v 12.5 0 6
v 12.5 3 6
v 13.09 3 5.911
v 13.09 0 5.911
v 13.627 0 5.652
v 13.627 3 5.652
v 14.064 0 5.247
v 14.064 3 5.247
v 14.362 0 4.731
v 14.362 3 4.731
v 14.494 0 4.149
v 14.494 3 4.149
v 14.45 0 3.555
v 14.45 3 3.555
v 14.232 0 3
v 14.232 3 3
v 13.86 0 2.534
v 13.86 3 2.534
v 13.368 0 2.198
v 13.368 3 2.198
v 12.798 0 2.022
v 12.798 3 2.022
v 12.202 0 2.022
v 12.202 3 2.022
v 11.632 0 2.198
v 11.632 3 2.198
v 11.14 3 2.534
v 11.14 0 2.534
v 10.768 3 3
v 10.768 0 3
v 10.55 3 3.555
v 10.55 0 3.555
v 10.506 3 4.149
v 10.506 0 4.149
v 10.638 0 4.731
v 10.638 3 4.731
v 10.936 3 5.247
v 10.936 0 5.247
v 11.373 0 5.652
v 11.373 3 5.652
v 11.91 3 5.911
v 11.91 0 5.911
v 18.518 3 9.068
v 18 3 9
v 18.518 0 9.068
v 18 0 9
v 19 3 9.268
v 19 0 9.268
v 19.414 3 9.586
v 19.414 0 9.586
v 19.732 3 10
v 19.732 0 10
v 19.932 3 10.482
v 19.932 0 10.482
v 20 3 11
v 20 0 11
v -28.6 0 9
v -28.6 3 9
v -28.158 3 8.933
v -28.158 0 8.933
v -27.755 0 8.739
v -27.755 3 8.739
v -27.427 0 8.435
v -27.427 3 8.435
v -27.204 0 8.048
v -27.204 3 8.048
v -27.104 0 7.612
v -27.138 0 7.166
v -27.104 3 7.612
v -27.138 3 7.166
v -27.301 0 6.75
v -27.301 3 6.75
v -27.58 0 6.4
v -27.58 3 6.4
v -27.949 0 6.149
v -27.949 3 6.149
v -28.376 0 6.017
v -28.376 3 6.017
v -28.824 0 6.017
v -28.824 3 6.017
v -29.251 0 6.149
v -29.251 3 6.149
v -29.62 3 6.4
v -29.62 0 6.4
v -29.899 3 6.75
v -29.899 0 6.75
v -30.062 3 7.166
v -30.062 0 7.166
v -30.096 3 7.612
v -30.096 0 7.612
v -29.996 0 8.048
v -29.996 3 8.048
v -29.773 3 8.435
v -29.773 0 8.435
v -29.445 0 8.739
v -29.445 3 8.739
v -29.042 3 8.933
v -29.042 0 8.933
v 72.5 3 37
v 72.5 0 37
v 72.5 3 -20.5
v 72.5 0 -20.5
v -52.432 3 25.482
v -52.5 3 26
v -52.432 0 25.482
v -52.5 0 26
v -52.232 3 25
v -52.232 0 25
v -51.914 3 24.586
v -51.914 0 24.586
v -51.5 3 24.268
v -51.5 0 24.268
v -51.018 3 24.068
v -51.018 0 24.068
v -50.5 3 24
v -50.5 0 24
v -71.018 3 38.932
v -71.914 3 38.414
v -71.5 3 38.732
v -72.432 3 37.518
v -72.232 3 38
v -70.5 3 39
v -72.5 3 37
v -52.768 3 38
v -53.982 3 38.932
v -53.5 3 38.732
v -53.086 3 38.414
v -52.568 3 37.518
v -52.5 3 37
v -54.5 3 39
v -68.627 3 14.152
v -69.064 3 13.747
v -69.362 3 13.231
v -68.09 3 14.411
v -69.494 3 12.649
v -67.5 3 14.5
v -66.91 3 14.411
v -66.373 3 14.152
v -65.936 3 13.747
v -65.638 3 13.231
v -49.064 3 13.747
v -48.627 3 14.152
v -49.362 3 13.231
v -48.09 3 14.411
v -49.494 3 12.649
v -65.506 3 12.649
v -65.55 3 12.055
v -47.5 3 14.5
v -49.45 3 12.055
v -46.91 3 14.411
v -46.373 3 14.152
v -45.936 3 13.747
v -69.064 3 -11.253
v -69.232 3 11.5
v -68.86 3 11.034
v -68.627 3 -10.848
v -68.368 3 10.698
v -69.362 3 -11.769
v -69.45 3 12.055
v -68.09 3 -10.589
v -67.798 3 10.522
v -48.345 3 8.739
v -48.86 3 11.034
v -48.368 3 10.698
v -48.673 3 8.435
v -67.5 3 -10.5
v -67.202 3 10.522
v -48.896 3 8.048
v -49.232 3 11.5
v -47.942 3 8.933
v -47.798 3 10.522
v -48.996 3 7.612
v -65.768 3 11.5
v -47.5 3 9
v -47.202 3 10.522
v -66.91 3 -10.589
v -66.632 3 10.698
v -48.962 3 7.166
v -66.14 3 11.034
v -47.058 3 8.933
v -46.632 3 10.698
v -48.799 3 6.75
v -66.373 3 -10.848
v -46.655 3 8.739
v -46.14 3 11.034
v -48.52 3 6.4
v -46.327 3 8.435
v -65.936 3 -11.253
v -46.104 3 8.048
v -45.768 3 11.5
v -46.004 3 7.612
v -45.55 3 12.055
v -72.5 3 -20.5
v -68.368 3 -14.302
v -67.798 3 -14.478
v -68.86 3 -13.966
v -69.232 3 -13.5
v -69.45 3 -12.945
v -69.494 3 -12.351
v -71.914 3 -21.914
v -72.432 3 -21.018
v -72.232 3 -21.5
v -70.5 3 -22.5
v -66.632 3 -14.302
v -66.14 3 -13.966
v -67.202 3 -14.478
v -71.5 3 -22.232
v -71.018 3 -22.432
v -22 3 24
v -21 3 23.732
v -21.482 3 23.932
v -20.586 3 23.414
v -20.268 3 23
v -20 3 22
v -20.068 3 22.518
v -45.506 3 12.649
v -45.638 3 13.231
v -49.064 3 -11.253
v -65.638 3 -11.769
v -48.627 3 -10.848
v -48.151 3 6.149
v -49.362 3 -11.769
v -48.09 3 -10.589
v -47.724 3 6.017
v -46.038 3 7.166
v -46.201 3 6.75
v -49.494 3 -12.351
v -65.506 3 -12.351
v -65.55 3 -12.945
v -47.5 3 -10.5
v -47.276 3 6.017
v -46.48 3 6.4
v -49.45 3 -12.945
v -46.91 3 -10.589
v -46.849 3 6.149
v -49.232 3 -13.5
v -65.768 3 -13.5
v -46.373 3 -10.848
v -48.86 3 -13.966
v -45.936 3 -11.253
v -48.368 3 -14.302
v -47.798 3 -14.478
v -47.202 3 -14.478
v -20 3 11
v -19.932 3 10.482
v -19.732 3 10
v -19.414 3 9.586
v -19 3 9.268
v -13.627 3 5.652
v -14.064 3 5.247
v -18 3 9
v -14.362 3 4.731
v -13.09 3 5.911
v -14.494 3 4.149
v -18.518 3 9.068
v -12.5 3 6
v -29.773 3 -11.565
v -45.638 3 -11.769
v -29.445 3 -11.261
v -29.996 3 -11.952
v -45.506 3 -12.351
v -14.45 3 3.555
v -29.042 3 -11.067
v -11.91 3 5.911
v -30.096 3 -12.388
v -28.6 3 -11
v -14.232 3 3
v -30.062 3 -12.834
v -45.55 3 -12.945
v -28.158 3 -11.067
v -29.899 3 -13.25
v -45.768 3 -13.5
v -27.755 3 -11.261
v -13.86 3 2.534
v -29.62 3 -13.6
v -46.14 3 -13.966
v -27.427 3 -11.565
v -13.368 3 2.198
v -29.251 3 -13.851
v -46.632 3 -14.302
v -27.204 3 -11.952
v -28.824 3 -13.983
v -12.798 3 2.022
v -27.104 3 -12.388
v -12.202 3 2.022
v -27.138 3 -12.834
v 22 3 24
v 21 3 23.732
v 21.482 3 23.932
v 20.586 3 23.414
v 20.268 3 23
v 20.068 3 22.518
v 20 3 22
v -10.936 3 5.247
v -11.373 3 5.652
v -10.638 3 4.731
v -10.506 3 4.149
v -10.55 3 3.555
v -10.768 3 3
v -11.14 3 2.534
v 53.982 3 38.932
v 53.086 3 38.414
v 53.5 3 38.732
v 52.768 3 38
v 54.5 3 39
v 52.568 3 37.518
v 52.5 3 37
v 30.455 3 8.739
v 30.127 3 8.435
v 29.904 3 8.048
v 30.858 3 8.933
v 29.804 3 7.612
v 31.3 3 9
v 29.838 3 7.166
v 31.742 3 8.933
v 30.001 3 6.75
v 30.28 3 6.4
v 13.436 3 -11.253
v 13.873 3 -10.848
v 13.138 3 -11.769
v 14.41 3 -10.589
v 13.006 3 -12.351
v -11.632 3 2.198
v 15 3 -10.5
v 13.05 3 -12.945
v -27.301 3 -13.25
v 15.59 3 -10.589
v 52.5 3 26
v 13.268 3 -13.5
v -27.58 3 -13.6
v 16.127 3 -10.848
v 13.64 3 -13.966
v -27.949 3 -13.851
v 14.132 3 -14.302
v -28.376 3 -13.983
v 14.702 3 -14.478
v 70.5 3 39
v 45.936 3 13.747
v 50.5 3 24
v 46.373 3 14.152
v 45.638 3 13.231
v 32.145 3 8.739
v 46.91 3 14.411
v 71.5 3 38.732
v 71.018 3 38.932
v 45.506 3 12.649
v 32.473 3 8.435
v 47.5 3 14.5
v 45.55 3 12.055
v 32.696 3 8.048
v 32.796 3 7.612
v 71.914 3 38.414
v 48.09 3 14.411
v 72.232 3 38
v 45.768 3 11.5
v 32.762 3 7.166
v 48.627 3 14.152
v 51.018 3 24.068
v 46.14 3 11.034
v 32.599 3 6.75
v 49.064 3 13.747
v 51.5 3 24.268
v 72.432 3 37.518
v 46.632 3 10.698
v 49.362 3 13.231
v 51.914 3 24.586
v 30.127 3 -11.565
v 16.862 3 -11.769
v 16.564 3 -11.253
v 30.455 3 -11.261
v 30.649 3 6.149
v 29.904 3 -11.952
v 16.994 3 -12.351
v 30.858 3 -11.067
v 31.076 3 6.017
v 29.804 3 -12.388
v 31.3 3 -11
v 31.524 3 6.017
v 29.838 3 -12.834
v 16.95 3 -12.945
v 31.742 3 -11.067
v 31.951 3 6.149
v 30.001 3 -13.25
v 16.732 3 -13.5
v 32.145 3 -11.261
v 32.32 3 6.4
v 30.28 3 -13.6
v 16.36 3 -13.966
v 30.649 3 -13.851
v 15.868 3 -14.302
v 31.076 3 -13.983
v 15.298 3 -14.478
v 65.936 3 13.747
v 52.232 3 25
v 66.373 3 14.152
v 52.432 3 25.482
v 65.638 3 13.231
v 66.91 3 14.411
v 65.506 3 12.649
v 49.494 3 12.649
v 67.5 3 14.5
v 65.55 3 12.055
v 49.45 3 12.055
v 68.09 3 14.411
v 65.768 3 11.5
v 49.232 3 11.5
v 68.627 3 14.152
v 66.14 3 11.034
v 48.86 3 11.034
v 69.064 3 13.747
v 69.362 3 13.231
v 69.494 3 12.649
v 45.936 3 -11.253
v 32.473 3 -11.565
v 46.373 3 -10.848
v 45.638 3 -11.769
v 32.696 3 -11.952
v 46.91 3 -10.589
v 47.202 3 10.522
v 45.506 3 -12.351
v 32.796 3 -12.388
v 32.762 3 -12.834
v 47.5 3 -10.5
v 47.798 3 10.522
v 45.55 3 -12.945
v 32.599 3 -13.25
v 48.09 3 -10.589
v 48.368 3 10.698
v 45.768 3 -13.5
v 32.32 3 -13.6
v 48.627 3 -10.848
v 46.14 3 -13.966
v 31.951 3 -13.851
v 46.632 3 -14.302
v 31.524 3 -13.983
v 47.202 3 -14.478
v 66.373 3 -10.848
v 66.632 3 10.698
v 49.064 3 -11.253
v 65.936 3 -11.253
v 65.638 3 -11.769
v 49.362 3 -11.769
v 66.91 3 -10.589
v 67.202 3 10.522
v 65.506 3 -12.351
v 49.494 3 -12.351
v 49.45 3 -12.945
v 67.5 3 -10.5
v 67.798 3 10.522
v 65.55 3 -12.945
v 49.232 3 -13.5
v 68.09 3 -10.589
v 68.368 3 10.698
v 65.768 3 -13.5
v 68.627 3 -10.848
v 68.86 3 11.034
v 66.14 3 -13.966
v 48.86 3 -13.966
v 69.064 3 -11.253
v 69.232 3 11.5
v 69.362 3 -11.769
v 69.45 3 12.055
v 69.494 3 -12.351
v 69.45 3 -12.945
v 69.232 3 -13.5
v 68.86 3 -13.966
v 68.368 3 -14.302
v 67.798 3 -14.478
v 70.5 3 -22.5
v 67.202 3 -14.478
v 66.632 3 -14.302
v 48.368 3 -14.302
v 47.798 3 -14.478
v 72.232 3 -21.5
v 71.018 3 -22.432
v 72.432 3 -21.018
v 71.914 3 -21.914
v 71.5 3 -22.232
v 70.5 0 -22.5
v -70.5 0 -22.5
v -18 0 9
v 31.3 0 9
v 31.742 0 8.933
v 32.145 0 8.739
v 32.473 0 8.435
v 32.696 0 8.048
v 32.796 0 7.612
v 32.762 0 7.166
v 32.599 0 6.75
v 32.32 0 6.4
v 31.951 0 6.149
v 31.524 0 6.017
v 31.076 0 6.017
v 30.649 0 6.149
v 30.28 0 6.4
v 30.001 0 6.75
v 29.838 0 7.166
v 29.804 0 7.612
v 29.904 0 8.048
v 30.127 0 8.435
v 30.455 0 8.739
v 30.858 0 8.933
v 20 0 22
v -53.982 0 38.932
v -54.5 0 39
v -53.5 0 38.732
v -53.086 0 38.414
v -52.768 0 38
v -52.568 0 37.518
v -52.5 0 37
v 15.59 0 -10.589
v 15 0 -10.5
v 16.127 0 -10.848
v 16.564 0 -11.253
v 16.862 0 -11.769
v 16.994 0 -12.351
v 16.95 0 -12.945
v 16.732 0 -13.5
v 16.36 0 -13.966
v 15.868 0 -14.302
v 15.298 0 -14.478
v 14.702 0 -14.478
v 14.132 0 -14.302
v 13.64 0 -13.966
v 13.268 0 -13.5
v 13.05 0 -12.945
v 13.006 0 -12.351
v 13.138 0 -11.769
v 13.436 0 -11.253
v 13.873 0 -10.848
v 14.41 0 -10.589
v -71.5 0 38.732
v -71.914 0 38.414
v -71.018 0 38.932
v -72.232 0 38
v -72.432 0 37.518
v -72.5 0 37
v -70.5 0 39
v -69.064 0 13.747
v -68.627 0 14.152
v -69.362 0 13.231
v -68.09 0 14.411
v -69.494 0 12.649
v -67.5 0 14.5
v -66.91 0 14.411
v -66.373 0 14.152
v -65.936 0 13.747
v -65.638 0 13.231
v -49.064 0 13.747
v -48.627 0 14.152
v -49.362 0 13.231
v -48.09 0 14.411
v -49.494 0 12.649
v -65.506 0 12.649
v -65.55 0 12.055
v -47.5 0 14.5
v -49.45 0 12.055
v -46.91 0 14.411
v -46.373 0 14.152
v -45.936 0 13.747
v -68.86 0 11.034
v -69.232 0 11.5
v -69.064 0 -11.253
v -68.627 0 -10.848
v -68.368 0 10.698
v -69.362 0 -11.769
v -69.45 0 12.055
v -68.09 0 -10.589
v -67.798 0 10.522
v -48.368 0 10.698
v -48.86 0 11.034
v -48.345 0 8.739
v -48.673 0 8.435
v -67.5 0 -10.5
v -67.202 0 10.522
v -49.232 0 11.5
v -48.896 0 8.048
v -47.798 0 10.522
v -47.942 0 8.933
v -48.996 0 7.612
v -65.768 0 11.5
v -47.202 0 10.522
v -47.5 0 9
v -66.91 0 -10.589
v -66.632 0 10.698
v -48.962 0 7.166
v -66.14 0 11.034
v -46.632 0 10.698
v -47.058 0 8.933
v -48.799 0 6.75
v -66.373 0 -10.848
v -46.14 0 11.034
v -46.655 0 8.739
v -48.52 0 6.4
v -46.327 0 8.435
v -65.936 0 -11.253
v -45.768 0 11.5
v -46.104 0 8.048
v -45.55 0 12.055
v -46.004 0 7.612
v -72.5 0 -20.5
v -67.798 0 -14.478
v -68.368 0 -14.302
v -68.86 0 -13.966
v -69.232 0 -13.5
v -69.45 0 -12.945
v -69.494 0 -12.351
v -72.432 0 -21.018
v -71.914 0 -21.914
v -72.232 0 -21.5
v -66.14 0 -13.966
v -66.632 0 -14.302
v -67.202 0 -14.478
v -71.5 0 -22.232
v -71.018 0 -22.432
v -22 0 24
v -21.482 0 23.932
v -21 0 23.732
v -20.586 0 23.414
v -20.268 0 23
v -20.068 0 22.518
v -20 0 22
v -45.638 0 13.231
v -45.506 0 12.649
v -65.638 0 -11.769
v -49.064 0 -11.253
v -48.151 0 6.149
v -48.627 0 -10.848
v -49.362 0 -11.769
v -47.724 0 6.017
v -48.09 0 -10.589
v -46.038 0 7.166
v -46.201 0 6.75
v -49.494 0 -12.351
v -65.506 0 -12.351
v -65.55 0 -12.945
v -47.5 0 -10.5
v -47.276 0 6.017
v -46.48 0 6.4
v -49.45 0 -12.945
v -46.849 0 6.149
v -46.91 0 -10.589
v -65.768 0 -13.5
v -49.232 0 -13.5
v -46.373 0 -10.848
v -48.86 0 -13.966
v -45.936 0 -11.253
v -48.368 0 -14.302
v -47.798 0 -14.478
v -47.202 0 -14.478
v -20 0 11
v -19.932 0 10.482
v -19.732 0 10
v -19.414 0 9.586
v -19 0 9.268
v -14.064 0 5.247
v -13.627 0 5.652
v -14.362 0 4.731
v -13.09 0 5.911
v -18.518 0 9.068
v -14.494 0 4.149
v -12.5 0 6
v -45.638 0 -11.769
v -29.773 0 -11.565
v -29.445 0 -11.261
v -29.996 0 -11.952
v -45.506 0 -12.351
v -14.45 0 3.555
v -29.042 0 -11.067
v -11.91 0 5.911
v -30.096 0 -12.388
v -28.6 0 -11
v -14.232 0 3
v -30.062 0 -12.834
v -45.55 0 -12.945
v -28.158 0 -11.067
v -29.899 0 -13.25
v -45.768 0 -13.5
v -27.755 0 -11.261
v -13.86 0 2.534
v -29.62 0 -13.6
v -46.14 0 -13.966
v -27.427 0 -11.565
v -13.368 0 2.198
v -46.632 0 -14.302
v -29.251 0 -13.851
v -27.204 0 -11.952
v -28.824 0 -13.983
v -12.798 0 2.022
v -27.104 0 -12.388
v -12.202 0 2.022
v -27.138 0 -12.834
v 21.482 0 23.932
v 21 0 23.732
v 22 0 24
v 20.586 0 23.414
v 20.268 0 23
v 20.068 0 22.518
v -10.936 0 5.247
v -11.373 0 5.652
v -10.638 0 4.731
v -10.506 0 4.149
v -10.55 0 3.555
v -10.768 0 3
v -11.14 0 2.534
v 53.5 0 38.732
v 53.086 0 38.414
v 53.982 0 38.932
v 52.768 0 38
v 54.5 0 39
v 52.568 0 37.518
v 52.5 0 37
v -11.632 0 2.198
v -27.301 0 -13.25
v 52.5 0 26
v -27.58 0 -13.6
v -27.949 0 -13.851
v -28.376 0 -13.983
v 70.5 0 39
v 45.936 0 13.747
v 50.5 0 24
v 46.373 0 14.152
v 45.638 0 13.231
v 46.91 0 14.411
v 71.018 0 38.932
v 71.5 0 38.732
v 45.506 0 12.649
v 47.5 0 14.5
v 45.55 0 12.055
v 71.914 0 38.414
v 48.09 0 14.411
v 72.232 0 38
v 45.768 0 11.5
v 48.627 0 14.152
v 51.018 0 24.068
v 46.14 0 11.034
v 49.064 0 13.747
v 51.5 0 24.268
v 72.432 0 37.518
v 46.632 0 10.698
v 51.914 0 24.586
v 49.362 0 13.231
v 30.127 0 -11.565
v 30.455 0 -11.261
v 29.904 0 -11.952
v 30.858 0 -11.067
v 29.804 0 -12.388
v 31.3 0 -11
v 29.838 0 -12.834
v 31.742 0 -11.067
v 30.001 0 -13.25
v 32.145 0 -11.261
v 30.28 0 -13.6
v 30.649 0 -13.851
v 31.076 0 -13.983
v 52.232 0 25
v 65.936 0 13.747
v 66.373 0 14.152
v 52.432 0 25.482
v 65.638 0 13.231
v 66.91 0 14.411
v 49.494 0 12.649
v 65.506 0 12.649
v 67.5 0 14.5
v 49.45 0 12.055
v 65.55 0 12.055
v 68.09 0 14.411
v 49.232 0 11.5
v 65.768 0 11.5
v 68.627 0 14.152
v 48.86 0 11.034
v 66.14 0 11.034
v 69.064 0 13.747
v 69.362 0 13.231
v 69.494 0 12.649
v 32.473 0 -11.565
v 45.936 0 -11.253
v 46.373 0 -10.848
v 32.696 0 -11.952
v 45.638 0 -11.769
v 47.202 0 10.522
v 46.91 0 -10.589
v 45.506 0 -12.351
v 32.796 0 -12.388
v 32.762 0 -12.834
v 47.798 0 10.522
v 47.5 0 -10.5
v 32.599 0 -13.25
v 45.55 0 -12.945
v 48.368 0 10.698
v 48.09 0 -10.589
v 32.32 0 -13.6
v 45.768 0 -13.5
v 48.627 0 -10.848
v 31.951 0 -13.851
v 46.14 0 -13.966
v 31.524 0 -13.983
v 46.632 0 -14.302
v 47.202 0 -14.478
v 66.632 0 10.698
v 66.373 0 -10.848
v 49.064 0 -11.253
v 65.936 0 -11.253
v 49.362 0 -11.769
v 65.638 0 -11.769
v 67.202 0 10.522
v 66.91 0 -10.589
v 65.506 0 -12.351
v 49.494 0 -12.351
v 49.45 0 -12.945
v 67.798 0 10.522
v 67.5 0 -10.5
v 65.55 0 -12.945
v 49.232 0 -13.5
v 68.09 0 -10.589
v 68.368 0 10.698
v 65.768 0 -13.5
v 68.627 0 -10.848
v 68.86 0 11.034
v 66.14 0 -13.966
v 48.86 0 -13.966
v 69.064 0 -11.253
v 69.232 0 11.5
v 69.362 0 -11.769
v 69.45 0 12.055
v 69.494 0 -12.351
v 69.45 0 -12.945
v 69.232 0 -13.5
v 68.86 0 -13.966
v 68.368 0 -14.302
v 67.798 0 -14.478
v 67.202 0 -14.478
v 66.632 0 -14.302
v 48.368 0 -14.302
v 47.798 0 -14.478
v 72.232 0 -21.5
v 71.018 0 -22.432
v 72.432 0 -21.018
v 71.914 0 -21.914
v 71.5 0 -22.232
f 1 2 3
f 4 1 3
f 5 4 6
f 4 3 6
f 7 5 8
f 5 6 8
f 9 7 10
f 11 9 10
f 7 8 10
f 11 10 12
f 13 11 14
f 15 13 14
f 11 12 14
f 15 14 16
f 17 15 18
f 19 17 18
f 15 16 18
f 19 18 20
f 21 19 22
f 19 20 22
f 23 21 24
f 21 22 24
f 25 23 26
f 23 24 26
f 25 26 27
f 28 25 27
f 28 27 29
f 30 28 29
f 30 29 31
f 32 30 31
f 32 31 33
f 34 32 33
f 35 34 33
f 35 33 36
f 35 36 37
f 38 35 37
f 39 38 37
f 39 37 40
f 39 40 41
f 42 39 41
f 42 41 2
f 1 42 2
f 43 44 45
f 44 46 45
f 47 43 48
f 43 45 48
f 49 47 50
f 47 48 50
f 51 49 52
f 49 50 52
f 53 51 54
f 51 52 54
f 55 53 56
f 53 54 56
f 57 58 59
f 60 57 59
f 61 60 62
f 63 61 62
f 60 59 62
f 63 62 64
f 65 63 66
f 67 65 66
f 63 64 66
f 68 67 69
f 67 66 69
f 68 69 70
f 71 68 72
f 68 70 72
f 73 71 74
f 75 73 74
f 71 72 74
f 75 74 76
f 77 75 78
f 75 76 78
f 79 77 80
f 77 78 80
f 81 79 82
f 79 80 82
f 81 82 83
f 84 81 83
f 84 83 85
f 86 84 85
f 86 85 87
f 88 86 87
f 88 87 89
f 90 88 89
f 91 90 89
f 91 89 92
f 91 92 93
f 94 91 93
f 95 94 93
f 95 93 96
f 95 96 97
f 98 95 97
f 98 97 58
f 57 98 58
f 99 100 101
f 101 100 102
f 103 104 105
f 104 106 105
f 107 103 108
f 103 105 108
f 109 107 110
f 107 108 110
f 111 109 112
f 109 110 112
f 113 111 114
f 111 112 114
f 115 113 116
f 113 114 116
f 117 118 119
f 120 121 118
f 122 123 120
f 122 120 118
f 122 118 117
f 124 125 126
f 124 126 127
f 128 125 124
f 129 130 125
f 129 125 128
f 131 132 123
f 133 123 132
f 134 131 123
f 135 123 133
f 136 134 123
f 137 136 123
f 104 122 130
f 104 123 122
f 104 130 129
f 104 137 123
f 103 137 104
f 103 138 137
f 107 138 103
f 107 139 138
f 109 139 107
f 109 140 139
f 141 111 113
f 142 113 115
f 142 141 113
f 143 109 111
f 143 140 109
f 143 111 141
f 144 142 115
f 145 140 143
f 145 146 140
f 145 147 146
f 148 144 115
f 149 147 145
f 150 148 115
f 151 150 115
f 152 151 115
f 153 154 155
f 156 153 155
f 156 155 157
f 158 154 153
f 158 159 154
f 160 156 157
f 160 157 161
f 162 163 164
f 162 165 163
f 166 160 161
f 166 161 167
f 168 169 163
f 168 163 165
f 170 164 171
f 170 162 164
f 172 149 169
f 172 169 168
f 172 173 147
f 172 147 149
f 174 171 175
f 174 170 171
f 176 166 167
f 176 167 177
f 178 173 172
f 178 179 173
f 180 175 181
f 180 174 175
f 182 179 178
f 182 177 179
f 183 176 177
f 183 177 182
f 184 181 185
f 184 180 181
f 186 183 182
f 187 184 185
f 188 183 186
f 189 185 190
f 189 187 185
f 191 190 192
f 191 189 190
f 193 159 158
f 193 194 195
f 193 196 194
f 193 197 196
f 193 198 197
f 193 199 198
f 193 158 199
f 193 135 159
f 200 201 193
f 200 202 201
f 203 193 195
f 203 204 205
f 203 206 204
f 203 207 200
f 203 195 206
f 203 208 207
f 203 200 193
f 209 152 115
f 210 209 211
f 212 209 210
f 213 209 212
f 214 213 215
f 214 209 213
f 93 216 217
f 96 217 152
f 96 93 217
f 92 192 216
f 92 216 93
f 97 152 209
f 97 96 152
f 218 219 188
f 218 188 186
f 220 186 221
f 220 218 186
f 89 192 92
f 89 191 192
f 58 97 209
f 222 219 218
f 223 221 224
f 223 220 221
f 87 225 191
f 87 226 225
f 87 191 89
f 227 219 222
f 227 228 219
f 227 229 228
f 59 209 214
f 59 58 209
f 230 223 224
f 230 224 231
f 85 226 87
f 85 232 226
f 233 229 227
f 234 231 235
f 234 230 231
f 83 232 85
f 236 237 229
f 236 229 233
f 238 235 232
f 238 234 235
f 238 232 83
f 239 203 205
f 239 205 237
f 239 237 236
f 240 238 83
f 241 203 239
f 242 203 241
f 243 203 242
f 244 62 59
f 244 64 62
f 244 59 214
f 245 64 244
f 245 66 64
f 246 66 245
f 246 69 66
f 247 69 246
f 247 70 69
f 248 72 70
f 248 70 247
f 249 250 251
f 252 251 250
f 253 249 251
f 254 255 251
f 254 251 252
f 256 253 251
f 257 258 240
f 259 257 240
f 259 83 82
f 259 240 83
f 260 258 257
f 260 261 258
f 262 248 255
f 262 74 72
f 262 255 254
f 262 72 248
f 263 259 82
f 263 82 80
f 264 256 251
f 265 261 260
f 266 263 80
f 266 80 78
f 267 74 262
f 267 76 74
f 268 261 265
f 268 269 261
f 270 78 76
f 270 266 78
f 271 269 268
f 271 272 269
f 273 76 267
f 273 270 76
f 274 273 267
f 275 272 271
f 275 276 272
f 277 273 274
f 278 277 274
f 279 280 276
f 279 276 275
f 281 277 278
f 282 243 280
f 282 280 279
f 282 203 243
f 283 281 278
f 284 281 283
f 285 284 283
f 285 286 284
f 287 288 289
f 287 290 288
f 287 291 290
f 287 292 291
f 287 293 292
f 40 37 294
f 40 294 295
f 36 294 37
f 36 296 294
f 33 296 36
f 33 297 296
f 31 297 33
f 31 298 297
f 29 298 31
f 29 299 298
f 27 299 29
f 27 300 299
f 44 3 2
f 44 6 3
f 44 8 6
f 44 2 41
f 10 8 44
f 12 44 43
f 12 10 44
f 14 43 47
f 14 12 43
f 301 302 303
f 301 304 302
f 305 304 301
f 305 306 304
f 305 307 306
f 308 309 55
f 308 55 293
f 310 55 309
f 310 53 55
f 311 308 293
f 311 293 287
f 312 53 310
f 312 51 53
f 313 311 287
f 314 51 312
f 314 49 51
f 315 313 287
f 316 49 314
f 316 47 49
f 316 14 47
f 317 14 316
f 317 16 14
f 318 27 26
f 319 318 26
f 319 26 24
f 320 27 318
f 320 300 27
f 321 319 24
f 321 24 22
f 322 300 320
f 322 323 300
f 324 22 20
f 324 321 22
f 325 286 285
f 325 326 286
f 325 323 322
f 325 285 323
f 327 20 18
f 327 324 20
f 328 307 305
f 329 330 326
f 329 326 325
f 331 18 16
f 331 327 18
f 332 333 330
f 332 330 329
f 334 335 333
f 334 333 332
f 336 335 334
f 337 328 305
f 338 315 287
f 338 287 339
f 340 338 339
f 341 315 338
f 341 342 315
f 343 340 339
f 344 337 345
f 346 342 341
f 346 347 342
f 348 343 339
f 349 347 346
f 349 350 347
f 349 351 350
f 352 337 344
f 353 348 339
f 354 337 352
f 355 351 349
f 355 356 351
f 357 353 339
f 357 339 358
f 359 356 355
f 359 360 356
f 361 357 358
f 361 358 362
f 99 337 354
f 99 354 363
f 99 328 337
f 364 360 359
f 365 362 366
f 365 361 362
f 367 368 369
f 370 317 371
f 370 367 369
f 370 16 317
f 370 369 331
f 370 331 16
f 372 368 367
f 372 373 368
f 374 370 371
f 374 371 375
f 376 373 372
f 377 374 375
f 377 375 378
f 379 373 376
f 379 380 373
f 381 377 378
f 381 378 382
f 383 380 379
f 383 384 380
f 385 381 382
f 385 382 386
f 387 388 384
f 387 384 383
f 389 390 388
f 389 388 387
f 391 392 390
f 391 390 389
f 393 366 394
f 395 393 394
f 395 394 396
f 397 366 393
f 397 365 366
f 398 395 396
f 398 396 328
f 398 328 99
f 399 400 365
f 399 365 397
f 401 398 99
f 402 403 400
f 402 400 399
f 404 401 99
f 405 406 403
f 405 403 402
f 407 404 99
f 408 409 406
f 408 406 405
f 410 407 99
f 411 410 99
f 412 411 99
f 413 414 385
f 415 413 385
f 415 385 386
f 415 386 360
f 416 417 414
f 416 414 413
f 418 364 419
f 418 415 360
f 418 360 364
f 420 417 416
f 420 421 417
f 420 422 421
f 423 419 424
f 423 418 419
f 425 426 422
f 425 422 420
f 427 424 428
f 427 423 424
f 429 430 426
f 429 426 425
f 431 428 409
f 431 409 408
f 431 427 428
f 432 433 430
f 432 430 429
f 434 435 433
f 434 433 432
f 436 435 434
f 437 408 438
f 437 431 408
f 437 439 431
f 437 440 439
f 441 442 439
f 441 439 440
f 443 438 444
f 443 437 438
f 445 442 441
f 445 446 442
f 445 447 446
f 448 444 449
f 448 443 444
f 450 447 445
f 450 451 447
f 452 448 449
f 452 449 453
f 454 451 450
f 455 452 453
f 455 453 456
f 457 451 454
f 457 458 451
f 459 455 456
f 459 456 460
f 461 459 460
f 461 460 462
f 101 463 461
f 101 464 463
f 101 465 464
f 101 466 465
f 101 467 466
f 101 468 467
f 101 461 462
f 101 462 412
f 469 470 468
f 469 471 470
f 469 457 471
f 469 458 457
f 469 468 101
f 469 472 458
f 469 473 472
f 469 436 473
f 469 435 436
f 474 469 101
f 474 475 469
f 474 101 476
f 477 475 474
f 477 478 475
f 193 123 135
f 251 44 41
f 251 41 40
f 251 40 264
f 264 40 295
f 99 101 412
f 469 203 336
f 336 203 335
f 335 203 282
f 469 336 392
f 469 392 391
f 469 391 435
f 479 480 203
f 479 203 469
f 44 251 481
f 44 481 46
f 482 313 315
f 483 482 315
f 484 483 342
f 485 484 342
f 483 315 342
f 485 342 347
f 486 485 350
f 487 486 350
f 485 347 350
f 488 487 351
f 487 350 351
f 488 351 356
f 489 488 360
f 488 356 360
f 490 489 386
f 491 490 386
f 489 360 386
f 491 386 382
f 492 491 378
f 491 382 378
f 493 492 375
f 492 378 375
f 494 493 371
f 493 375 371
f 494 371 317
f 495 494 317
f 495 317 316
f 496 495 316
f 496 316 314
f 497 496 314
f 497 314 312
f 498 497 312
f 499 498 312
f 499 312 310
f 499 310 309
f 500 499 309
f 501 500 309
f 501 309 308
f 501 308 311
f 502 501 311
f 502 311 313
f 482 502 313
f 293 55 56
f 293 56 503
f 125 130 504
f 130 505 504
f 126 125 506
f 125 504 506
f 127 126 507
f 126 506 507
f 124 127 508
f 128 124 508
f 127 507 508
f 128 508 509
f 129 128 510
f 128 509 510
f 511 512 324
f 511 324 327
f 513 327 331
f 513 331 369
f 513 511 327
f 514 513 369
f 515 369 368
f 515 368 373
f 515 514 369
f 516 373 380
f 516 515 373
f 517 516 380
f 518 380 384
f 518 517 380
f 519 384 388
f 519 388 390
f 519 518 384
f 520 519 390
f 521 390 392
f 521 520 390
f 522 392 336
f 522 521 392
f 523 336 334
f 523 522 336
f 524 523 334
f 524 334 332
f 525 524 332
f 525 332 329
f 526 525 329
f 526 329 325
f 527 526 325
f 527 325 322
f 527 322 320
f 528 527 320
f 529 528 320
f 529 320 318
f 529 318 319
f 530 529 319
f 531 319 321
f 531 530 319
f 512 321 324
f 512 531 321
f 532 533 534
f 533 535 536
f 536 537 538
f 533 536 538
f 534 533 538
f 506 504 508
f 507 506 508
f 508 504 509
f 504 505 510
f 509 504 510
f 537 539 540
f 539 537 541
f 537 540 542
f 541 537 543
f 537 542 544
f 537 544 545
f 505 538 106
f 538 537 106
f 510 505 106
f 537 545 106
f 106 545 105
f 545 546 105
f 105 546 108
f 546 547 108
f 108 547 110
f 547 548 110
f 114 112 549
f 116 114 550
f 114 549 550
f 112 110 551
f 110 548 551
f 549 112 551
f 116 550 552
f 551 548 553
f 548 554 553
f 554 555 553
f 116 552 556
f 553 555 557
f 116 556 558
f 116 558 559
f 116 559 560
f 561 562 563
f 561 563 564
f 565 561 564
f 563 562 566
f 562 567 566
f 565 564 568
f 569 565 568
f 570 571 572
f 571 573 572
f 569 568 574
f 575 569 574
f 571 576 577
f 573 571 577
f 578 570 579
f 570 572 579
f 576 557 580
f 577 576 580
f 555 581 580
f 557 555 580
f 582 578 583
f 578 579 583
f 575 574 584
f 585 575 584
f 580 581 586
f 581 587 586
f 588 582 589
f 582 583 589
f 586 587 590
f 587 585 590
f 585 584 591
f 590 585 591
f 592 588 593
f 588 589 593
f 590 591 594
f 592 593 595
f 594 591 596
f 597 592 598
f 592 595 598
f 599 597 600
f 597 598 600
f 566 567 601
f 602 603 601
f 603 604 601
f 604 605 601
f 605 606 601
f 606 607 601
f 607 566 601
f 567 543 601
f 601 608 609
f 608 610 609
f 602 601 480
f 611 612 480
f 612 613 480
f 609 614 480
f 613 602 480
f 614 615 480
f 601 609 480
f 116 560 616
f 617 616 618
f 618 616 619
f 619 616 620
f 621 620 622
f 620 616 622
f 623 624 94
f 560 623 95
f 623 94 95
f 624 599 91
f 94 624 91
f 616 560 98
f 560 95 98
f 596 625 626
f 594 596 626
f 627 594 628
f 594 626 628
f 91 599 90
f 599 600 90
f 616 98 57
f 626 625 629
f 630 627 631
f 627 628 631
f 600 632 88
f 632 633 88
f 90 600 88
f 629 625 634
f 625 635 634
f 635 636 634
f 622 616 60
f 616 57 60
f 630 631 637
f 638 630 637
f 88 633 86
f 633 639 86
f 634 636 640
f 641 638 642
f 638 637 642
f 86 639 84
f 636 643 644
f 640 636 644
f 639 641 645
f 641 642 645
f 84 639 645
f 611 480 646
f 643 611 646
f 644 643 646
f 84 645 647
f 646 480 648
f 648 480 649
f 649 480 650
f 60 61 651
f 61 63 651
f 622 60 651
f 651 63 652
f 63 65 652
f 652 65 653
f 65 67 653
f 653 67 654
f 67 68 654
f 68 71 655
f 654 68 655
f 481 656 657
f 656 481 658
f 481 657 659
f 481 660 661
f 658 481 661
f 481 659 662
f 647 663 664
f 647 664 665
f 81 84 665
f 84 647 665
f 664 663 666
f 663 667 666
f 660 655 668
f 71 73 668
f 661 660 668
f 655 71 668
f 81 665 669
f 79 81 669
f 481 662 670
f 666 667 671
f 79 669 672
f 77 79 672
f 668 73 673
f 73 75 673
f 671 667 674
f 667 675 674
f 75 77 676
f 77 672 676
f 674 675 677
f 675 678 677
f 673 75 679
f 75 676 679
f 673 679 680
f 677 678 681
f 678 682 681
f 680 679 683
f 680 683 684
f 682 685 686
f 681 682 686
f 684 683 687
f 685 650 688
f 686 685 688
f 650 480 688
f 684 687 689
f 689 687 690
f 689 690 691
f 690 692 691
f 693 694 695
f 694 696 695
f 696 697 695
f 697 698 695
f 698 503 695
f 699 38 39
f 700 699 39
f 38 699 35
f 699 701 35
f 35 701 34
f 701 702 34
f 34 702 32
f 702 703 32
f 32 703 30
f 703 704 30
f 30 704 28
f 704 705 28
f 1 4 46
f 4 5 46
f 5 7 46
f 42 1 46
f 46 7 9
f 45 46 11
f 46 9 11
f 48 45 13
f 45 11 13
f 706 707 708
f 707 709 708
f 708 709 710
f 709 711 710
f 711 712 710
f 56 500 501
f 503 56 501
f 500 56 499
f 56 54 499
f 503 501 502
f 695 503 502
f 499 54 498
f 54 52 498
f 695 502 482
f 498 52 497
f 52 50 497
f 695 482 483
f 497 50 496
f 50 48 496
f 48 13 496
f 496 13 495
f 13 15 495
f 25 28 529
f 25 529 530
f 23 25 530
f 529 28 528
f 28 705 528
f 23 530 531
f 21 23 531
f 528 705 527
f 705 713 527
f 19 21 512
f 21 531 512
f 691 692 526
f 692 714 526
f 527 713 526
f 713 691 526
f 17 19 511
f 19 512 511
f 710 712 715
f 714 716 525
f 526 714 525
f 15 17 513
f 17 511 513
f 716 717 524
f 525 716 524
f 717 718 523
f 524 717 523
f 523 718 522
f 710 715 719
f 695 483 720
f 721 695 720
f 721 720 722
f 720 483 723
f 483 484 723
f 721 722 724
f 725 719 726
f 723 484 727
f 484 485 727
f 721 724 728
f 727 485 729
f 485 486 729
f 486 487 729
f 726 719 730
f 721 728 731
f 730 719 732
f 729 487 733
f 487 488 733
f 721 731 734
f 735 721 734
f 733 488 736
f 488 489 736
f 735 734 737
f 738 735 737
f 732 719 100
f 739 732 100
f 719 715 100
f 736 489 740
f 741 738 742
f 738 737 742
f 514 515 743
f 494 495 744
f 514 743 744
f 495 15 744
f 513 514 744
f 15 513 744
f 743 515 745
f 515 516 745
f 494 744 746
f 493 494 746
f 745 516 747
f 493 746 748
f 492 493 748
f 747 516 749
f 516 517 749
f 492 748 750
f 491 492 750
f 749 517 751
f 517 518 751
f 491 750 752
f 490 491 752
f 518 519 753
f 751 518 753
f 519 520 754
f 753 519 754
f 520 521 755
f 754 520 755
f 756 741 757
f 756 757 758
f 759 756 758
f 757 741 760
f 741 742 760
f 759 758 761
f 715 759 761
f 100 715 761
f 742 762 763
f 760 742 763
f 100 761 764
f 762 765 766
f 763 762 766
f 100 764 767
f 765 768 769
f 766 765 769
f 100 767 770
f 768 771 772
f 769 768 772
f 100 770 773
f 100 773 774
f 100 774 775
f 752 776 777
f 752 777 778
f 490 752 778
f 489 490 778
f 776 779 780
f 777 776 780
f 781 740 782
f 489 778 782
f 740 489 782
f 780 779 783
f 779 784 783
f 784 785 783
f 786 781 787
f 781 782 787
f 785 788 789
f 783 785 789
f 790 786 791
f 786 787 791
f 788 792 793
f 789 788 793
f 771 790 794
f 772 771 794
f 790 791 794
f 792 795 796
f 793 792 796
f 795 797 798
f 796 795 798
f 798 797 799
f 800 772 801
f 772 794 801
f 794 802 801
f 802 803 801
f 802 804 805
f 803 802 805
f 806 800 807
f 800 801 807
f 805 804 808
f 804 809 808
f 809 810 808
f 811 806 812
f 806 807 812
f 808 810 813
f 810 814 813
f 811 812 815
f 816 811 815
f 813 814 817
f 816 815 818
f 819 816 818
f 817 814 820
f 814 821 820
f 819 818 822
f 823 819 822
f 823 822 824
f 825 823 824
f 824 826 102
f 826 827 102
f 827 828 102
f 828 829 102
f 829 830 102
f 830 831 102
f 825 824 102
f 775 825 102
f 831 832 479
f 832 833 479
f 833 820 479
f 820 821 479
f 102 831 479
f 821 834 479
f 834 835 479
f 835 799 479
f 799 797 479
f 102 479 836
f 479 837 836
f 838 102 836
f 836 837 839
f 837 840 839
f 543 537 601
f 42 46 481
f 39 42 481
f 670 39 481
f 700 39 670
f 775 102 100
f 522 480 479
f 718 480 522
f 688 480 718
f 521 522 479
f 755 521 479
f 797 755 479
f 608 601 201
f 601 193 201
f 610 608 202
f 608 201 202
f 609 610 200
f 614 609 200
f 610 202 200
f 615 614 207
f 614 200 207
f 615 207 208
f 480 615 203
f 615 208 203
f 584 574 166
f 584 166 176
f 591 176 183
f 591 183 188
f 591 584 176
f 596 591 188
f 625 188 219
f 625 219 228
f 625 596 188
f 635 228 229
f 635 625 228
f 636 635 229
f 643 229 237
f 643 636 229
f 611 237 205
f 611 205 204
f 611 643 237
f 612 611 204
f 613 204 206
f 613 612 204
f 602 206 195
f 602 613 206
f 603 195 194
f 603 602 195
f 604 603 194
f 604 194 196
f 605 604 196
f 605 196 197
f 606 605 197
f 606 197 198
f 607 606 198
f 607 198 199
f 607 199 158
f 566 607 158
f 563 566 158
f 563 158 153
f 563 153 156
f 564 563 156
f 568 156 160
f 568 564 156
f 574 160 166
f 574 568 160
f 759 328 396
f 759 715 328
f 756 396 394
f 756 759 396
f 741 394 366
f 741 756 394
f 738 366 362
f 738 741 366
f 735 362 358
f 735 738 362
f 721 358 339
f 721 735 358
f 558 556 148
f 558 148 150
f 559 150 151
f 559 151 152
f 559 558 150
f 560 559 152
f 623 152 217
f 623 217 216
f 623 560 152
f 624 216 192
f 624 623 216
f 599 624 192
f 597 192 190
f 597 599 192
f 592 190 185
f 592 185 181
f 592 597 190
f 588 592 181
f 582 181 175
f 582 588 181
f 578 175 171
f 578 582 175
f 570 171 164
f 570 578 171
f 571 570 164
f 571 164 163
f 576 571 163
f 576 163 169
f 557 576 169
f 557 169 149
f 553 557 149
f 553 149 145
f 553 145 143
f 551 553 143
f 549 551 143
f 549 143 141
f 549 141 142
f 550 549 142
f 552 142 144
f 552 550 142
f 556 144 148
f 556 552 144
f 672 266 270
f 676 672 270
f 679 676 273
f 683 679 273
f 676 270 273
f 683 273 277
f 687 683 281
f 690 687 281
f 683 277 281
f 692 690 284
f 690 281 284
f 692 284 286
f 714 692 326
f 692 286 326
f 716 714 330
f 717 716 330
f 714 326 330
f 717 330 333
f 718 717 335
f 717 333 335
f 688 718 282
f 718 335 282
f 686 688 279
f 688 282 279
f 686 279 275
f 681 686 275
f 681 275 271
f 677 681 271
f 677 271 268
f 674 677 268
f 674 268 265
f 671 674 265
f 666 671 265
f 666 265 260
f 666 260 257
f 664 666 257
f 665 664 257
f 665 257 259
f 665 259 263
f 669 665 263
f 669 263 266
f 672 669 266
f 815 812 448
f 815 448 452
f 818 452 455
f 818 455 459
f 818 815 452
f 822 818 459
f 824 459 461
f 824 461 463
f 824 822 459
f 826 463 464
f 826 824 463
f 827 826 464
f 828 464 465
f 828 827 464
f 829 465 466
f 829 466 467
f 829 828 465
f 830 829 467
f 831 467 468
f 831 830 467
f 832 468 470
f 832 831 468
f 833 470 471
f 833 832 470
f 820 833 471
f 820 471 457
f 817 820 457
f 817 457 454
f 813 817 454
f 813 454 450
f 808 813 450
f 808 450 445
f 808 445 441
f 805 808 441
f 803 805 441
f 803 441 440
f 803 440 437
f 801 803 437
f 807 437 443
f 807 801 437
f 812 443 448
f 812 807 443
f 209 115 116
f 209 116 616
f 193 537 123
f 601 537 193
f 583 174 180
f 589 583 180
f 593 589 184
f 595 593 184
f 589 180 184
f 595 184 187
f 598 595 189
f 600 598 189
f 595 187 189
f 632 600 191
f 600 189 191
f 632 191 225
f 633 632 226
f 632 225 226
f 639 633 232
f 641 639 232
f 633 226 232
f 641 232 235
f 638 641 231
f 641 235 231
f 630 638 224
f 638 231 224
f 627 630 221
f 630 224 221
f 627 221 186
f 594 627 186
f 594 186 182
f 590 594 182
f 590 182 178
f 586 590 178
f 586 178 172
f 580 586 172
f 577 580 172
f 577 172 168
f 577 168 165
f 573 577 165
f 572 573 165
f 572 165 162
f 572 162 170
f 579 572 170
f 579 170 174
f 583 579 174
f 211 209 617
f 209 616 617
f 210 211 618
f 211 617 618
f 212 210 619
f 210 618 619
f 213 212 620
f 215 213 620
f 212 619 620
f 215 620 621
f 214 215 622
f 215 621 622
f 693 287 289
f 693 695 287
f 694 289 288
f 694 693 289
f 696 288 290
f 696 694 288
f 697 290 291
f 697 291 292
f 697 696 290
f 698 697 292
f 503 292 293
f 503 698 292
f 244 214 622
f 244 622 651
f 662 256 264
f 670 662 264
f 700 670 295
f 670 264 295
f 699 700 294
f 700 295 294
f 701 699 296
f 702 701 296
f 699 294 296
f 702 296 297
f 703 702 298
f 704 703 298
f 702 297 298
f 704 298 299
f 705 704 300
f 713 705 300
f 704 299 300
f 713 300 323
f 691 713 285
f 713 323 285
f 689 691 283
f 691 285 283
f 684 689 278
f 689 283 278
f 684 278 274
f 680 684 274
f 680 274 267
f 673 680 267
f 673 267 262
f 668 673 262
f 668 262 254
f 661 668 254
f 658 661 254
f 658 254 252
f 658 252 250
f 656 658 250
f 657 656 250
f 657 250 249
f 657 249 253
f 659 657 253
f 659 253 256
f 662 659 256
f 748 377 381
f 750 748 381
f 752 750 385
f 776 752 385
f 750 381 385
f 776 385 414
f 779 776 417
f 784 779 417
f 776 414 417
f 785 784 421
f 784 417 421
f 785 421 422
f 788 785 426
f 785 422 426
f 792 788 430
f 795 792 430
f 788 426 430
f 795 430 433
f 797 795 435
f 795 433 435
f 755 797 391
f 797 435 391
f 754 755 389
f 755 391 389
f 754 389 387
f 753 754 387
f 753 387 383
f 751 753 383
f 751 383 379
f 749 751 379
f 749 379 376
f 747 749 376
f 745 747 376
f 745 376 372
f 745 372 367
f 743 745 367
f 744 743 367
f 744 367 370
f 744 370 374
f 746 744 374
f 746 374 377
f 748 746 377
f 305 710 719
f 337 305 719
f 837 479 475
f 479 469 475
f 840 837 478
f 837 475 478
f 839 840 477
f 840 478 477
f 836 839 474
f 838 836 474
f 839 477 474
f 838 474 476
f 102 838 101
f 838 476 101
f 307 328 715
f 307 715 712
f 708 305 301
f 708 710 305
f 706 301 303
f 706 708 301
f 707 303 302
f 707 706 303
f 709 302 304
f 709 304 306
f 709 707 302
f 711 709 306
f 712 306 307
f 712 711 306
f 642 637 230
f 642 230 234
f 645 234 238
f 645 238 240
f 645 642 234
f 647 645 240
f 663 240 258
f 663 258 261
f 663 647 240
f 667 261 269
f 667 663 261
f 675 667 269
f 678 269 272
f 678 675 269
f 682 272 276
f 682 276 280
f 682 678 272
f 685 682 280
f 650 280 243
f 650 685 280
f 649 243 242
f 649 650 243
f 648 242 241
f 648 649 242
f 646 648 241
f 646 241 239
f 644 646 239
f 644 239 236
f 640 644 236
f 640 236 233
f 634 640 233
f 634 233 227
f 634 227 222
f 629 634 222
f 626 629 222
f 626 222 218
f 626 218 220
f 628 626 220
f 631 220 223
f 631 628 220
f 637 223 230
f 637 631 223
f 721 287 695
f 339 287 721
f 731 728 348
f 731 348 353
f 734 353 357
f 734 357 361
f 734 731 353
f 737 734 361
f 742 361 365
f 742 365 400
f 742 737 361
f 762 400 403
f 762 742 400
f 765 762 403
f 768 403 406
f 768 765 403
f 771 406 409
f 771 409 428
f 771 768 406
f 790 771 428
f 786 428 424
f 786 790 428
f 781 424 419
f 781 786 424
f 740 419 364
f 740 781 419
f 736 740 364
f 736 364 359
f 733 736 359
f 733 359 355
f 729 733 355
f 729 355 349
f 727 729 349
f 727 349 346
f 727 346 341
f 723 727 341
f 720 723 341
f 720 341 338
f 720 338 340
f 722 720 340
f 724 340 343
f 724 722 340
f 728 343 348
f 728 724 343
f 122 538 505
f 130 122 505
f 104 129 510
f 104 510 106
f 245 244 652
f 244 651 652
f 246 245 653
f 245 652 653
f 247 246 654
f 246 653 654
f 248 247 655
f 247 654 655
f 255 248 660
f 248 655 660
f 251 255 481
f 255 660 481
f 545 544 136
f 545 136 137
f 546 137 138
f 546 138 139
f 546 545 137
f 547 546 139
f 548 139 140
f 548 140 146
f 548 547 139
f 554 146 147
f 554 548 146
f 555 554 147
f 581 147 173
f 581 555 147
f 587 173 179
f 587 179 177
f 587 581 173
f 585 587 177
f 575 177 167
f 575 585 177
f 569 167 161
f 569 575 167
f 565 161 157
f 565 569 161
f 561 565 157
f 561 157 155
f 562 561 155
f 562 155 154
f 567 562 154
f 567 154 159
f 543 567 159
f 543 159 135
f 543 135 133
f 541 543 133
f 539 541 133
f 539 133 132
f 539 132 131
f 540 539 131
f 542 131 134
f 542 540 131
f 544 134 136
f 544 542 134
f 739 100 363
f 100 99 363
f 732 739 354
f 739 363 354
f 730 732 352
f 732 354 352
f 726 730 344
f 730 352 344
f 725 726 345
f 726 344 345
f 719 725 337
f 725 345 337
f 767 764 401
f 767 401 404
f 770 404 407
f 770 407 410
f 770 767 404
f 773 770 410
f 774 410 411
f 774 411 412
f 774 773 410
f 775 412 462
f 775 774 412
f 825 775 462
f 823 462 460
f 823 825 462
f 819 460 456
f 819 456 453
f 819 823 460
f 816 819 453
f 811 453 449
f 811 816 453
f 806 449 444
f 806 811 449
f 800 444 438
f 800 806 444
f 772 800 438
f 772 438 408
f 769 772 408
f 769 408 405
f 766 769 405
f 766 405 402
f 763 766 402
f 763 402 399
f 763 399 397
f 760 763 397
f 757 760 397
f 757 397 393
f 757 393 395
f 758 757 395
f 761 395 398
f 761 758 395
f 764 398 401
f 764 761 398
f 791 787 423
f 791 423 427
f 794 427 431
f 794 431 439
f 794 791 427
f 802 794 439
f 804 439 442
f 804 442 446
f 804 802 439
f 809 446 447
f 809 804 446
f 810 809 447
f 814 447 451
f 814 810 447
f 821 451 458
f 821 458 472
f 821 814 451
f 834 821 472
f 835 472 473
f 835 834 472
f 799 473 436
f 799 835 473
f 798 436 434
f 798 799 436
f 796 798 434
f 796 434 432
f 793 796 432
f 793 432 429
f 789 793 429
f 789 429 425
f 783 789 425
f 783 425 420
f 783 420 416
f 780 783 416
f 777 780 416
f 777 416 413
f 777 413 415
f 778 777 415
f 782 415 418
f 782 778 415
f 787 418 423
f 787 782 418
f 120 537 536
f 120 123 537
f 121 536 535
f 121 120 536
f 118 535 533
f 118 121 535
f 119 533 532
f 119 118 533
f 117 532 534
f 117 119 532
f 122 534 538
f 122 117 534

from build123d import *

# Parameters (mm, degrees)
SKETCH_1_W          = 145
SKETCH_1_H          = 61.5
SKETCH_1_R          = 2
EXTRUDE_1_DEPTH     = 3
SKETCH_2_R          = 2
CUT_EXTRUDE_1_DEPTH = 10
SKETCH_3_R          = 1.5
CUT_EXTRUDE_2_DEPTH = 10
FILLET_2_R          = 2


with BuildPart() as part:
    # 草图1 → 凸台-拉伸1 (new body)
    with BuildSketch(Plane(origin=(0, 0, 0), x_dir=(1, 0, 0), z_dir=(0, 1, 0))):
        with Locations((0, -8.25)):
            Rectangle(SKETCH_1_W, SKETCH_1_H)
        with Locations(Location((-67.5, 12.5, 0), (0, 0, 270))):
            Circle(SKETCH_1_R, mode=Mode.SUBTRACT)
        with Locations(Location((-67.5, -12.5, 0), (0, 0, 270))):
            Circle(SKETCH_1_R, mode=Mode.SUBTRACT)
        with Locations(Location((67.5, 12.5, 0), (0, 0, 270))):
            Circle(SKETCH_1_R, mode=Mode.SUBTRACT)
        with Locations(Location((67.5, -12.5, 0), (0, 0, 270))):
            Circle(SKETCH_1_R, mode=Mode.SUBTRACT)
        with Locations(Location((15, 12.5, 0), (0, 0, 270))):
            Circle(SKETCH_1_R, mode=Mode.SUBTRACT)
        with Locations(Location((15, -12.5, 0), (0, 0, 270))):
            Circle(SKETCH_1_R, mode=Mode.SUBTRACT)
        with Locations(Location((-47.5, 12.5, 0), (0, 0, 270))):
            Circle(SKETCH_1_R, mode=Mode.SUBTRACT)
        with Locations(Location((-47.5, -12.5, 0), (0, 0, 270))):
            Circle(SKETCH_1_R, mode=Mode.SUBTRACT)
        with Locations(Location((47.5, 12.5, 0), (0, 0, 270))):
            Circle(SKETCH_1_R, mode=Mode.SUBTRACT)
        with Locations(Location((47.5, -12.5, 0), (0, 0, 270))):
            Circle(SKETCH_1_R, mode=Mode.SUBTRACT)
    extrude(amount=EXTRUDE_1_DEPTH)

    # 草图2 → 切除-拉伸1 (cut)
    with BuildSketch(Plane(origin=(0, 3, 0), x_dir=(1, 0, 0), z_dir=(0, 1, 0))):
        with Locations(Location((-12.5, -4, 0), (0, 0, 270))):
            Circle(SKETCH_2_R)
        with Locations(Location((12.5, -4, 0), (0, 0, 270))):
            Circle(SKETCH_2_R)
        Polygon((-52.5, -39), (-52.5, -24), (-20, -24), (-20, -9), (20, -9), (20, -24), (52.5, -24), (52.5, -39), align=None)
    extrude(amount=-CUT_EXTRUDE_1_DEPTH, mode=Mode.SUBTRACT)

    # 草图3 → 切除-拉伸2 (cut)
    with BuildSketch(Plane(origin=(0, 3, 0), x_dir=(1, 0, 0), z_dir=(0, 1, 0))):
        with Locations((-47.5, 12.5)):
            Circle(SKETCH_3_R)
        with Locations(Location((-47.5, -7.5, 0), (0, 0, 270))):
            Circle(SKETCH_3_R)
        with Locations(Location((31.3, 12.5, 0), (0, 0, 270))):
            Circle(SKETCH_3_R)
        with Locations(Location((31.3, -7.5, 0), (0, 0, 270))):
            Circle(SKETCH_3_R)
        with Locations(Location((-28.6, 12.5, 0), (0, 0, 270))):
            Circle(SKETCH_3_R)
        with Locations(Location((-28.6, -7.5, 0), (0, 0, 270))):
            Circle(SKETCH_3_R)
    extrude(amount=-CUT_EXTRUDE_2_DEPTH, mode=Mode.SUBTRACT)

    # 圆角2
    fillet_2_edges = [part.edges().sort_by_distance(p)[0] for p in [
        (52.5, 1.5, 39),
        (-52.5, 1.5, 39),
        (-52.5, 1.5, 24),
        (-20, 1.5, 24),
        (-20, 1.5, 9),
        (20, 1.5, 9),
        (20, 1.5, 24),
        (52.5, 1.5, 24),
        (72.5, 1.5, -22.5),
        (72.5, 1.5, 39),
        (-72.5, 1.5, 39),
        (-72.5, 1.5, -22.5),
    ]]
    fillet(fillet_2_edges, radius=FILLET_2_R)


solid = part.part
